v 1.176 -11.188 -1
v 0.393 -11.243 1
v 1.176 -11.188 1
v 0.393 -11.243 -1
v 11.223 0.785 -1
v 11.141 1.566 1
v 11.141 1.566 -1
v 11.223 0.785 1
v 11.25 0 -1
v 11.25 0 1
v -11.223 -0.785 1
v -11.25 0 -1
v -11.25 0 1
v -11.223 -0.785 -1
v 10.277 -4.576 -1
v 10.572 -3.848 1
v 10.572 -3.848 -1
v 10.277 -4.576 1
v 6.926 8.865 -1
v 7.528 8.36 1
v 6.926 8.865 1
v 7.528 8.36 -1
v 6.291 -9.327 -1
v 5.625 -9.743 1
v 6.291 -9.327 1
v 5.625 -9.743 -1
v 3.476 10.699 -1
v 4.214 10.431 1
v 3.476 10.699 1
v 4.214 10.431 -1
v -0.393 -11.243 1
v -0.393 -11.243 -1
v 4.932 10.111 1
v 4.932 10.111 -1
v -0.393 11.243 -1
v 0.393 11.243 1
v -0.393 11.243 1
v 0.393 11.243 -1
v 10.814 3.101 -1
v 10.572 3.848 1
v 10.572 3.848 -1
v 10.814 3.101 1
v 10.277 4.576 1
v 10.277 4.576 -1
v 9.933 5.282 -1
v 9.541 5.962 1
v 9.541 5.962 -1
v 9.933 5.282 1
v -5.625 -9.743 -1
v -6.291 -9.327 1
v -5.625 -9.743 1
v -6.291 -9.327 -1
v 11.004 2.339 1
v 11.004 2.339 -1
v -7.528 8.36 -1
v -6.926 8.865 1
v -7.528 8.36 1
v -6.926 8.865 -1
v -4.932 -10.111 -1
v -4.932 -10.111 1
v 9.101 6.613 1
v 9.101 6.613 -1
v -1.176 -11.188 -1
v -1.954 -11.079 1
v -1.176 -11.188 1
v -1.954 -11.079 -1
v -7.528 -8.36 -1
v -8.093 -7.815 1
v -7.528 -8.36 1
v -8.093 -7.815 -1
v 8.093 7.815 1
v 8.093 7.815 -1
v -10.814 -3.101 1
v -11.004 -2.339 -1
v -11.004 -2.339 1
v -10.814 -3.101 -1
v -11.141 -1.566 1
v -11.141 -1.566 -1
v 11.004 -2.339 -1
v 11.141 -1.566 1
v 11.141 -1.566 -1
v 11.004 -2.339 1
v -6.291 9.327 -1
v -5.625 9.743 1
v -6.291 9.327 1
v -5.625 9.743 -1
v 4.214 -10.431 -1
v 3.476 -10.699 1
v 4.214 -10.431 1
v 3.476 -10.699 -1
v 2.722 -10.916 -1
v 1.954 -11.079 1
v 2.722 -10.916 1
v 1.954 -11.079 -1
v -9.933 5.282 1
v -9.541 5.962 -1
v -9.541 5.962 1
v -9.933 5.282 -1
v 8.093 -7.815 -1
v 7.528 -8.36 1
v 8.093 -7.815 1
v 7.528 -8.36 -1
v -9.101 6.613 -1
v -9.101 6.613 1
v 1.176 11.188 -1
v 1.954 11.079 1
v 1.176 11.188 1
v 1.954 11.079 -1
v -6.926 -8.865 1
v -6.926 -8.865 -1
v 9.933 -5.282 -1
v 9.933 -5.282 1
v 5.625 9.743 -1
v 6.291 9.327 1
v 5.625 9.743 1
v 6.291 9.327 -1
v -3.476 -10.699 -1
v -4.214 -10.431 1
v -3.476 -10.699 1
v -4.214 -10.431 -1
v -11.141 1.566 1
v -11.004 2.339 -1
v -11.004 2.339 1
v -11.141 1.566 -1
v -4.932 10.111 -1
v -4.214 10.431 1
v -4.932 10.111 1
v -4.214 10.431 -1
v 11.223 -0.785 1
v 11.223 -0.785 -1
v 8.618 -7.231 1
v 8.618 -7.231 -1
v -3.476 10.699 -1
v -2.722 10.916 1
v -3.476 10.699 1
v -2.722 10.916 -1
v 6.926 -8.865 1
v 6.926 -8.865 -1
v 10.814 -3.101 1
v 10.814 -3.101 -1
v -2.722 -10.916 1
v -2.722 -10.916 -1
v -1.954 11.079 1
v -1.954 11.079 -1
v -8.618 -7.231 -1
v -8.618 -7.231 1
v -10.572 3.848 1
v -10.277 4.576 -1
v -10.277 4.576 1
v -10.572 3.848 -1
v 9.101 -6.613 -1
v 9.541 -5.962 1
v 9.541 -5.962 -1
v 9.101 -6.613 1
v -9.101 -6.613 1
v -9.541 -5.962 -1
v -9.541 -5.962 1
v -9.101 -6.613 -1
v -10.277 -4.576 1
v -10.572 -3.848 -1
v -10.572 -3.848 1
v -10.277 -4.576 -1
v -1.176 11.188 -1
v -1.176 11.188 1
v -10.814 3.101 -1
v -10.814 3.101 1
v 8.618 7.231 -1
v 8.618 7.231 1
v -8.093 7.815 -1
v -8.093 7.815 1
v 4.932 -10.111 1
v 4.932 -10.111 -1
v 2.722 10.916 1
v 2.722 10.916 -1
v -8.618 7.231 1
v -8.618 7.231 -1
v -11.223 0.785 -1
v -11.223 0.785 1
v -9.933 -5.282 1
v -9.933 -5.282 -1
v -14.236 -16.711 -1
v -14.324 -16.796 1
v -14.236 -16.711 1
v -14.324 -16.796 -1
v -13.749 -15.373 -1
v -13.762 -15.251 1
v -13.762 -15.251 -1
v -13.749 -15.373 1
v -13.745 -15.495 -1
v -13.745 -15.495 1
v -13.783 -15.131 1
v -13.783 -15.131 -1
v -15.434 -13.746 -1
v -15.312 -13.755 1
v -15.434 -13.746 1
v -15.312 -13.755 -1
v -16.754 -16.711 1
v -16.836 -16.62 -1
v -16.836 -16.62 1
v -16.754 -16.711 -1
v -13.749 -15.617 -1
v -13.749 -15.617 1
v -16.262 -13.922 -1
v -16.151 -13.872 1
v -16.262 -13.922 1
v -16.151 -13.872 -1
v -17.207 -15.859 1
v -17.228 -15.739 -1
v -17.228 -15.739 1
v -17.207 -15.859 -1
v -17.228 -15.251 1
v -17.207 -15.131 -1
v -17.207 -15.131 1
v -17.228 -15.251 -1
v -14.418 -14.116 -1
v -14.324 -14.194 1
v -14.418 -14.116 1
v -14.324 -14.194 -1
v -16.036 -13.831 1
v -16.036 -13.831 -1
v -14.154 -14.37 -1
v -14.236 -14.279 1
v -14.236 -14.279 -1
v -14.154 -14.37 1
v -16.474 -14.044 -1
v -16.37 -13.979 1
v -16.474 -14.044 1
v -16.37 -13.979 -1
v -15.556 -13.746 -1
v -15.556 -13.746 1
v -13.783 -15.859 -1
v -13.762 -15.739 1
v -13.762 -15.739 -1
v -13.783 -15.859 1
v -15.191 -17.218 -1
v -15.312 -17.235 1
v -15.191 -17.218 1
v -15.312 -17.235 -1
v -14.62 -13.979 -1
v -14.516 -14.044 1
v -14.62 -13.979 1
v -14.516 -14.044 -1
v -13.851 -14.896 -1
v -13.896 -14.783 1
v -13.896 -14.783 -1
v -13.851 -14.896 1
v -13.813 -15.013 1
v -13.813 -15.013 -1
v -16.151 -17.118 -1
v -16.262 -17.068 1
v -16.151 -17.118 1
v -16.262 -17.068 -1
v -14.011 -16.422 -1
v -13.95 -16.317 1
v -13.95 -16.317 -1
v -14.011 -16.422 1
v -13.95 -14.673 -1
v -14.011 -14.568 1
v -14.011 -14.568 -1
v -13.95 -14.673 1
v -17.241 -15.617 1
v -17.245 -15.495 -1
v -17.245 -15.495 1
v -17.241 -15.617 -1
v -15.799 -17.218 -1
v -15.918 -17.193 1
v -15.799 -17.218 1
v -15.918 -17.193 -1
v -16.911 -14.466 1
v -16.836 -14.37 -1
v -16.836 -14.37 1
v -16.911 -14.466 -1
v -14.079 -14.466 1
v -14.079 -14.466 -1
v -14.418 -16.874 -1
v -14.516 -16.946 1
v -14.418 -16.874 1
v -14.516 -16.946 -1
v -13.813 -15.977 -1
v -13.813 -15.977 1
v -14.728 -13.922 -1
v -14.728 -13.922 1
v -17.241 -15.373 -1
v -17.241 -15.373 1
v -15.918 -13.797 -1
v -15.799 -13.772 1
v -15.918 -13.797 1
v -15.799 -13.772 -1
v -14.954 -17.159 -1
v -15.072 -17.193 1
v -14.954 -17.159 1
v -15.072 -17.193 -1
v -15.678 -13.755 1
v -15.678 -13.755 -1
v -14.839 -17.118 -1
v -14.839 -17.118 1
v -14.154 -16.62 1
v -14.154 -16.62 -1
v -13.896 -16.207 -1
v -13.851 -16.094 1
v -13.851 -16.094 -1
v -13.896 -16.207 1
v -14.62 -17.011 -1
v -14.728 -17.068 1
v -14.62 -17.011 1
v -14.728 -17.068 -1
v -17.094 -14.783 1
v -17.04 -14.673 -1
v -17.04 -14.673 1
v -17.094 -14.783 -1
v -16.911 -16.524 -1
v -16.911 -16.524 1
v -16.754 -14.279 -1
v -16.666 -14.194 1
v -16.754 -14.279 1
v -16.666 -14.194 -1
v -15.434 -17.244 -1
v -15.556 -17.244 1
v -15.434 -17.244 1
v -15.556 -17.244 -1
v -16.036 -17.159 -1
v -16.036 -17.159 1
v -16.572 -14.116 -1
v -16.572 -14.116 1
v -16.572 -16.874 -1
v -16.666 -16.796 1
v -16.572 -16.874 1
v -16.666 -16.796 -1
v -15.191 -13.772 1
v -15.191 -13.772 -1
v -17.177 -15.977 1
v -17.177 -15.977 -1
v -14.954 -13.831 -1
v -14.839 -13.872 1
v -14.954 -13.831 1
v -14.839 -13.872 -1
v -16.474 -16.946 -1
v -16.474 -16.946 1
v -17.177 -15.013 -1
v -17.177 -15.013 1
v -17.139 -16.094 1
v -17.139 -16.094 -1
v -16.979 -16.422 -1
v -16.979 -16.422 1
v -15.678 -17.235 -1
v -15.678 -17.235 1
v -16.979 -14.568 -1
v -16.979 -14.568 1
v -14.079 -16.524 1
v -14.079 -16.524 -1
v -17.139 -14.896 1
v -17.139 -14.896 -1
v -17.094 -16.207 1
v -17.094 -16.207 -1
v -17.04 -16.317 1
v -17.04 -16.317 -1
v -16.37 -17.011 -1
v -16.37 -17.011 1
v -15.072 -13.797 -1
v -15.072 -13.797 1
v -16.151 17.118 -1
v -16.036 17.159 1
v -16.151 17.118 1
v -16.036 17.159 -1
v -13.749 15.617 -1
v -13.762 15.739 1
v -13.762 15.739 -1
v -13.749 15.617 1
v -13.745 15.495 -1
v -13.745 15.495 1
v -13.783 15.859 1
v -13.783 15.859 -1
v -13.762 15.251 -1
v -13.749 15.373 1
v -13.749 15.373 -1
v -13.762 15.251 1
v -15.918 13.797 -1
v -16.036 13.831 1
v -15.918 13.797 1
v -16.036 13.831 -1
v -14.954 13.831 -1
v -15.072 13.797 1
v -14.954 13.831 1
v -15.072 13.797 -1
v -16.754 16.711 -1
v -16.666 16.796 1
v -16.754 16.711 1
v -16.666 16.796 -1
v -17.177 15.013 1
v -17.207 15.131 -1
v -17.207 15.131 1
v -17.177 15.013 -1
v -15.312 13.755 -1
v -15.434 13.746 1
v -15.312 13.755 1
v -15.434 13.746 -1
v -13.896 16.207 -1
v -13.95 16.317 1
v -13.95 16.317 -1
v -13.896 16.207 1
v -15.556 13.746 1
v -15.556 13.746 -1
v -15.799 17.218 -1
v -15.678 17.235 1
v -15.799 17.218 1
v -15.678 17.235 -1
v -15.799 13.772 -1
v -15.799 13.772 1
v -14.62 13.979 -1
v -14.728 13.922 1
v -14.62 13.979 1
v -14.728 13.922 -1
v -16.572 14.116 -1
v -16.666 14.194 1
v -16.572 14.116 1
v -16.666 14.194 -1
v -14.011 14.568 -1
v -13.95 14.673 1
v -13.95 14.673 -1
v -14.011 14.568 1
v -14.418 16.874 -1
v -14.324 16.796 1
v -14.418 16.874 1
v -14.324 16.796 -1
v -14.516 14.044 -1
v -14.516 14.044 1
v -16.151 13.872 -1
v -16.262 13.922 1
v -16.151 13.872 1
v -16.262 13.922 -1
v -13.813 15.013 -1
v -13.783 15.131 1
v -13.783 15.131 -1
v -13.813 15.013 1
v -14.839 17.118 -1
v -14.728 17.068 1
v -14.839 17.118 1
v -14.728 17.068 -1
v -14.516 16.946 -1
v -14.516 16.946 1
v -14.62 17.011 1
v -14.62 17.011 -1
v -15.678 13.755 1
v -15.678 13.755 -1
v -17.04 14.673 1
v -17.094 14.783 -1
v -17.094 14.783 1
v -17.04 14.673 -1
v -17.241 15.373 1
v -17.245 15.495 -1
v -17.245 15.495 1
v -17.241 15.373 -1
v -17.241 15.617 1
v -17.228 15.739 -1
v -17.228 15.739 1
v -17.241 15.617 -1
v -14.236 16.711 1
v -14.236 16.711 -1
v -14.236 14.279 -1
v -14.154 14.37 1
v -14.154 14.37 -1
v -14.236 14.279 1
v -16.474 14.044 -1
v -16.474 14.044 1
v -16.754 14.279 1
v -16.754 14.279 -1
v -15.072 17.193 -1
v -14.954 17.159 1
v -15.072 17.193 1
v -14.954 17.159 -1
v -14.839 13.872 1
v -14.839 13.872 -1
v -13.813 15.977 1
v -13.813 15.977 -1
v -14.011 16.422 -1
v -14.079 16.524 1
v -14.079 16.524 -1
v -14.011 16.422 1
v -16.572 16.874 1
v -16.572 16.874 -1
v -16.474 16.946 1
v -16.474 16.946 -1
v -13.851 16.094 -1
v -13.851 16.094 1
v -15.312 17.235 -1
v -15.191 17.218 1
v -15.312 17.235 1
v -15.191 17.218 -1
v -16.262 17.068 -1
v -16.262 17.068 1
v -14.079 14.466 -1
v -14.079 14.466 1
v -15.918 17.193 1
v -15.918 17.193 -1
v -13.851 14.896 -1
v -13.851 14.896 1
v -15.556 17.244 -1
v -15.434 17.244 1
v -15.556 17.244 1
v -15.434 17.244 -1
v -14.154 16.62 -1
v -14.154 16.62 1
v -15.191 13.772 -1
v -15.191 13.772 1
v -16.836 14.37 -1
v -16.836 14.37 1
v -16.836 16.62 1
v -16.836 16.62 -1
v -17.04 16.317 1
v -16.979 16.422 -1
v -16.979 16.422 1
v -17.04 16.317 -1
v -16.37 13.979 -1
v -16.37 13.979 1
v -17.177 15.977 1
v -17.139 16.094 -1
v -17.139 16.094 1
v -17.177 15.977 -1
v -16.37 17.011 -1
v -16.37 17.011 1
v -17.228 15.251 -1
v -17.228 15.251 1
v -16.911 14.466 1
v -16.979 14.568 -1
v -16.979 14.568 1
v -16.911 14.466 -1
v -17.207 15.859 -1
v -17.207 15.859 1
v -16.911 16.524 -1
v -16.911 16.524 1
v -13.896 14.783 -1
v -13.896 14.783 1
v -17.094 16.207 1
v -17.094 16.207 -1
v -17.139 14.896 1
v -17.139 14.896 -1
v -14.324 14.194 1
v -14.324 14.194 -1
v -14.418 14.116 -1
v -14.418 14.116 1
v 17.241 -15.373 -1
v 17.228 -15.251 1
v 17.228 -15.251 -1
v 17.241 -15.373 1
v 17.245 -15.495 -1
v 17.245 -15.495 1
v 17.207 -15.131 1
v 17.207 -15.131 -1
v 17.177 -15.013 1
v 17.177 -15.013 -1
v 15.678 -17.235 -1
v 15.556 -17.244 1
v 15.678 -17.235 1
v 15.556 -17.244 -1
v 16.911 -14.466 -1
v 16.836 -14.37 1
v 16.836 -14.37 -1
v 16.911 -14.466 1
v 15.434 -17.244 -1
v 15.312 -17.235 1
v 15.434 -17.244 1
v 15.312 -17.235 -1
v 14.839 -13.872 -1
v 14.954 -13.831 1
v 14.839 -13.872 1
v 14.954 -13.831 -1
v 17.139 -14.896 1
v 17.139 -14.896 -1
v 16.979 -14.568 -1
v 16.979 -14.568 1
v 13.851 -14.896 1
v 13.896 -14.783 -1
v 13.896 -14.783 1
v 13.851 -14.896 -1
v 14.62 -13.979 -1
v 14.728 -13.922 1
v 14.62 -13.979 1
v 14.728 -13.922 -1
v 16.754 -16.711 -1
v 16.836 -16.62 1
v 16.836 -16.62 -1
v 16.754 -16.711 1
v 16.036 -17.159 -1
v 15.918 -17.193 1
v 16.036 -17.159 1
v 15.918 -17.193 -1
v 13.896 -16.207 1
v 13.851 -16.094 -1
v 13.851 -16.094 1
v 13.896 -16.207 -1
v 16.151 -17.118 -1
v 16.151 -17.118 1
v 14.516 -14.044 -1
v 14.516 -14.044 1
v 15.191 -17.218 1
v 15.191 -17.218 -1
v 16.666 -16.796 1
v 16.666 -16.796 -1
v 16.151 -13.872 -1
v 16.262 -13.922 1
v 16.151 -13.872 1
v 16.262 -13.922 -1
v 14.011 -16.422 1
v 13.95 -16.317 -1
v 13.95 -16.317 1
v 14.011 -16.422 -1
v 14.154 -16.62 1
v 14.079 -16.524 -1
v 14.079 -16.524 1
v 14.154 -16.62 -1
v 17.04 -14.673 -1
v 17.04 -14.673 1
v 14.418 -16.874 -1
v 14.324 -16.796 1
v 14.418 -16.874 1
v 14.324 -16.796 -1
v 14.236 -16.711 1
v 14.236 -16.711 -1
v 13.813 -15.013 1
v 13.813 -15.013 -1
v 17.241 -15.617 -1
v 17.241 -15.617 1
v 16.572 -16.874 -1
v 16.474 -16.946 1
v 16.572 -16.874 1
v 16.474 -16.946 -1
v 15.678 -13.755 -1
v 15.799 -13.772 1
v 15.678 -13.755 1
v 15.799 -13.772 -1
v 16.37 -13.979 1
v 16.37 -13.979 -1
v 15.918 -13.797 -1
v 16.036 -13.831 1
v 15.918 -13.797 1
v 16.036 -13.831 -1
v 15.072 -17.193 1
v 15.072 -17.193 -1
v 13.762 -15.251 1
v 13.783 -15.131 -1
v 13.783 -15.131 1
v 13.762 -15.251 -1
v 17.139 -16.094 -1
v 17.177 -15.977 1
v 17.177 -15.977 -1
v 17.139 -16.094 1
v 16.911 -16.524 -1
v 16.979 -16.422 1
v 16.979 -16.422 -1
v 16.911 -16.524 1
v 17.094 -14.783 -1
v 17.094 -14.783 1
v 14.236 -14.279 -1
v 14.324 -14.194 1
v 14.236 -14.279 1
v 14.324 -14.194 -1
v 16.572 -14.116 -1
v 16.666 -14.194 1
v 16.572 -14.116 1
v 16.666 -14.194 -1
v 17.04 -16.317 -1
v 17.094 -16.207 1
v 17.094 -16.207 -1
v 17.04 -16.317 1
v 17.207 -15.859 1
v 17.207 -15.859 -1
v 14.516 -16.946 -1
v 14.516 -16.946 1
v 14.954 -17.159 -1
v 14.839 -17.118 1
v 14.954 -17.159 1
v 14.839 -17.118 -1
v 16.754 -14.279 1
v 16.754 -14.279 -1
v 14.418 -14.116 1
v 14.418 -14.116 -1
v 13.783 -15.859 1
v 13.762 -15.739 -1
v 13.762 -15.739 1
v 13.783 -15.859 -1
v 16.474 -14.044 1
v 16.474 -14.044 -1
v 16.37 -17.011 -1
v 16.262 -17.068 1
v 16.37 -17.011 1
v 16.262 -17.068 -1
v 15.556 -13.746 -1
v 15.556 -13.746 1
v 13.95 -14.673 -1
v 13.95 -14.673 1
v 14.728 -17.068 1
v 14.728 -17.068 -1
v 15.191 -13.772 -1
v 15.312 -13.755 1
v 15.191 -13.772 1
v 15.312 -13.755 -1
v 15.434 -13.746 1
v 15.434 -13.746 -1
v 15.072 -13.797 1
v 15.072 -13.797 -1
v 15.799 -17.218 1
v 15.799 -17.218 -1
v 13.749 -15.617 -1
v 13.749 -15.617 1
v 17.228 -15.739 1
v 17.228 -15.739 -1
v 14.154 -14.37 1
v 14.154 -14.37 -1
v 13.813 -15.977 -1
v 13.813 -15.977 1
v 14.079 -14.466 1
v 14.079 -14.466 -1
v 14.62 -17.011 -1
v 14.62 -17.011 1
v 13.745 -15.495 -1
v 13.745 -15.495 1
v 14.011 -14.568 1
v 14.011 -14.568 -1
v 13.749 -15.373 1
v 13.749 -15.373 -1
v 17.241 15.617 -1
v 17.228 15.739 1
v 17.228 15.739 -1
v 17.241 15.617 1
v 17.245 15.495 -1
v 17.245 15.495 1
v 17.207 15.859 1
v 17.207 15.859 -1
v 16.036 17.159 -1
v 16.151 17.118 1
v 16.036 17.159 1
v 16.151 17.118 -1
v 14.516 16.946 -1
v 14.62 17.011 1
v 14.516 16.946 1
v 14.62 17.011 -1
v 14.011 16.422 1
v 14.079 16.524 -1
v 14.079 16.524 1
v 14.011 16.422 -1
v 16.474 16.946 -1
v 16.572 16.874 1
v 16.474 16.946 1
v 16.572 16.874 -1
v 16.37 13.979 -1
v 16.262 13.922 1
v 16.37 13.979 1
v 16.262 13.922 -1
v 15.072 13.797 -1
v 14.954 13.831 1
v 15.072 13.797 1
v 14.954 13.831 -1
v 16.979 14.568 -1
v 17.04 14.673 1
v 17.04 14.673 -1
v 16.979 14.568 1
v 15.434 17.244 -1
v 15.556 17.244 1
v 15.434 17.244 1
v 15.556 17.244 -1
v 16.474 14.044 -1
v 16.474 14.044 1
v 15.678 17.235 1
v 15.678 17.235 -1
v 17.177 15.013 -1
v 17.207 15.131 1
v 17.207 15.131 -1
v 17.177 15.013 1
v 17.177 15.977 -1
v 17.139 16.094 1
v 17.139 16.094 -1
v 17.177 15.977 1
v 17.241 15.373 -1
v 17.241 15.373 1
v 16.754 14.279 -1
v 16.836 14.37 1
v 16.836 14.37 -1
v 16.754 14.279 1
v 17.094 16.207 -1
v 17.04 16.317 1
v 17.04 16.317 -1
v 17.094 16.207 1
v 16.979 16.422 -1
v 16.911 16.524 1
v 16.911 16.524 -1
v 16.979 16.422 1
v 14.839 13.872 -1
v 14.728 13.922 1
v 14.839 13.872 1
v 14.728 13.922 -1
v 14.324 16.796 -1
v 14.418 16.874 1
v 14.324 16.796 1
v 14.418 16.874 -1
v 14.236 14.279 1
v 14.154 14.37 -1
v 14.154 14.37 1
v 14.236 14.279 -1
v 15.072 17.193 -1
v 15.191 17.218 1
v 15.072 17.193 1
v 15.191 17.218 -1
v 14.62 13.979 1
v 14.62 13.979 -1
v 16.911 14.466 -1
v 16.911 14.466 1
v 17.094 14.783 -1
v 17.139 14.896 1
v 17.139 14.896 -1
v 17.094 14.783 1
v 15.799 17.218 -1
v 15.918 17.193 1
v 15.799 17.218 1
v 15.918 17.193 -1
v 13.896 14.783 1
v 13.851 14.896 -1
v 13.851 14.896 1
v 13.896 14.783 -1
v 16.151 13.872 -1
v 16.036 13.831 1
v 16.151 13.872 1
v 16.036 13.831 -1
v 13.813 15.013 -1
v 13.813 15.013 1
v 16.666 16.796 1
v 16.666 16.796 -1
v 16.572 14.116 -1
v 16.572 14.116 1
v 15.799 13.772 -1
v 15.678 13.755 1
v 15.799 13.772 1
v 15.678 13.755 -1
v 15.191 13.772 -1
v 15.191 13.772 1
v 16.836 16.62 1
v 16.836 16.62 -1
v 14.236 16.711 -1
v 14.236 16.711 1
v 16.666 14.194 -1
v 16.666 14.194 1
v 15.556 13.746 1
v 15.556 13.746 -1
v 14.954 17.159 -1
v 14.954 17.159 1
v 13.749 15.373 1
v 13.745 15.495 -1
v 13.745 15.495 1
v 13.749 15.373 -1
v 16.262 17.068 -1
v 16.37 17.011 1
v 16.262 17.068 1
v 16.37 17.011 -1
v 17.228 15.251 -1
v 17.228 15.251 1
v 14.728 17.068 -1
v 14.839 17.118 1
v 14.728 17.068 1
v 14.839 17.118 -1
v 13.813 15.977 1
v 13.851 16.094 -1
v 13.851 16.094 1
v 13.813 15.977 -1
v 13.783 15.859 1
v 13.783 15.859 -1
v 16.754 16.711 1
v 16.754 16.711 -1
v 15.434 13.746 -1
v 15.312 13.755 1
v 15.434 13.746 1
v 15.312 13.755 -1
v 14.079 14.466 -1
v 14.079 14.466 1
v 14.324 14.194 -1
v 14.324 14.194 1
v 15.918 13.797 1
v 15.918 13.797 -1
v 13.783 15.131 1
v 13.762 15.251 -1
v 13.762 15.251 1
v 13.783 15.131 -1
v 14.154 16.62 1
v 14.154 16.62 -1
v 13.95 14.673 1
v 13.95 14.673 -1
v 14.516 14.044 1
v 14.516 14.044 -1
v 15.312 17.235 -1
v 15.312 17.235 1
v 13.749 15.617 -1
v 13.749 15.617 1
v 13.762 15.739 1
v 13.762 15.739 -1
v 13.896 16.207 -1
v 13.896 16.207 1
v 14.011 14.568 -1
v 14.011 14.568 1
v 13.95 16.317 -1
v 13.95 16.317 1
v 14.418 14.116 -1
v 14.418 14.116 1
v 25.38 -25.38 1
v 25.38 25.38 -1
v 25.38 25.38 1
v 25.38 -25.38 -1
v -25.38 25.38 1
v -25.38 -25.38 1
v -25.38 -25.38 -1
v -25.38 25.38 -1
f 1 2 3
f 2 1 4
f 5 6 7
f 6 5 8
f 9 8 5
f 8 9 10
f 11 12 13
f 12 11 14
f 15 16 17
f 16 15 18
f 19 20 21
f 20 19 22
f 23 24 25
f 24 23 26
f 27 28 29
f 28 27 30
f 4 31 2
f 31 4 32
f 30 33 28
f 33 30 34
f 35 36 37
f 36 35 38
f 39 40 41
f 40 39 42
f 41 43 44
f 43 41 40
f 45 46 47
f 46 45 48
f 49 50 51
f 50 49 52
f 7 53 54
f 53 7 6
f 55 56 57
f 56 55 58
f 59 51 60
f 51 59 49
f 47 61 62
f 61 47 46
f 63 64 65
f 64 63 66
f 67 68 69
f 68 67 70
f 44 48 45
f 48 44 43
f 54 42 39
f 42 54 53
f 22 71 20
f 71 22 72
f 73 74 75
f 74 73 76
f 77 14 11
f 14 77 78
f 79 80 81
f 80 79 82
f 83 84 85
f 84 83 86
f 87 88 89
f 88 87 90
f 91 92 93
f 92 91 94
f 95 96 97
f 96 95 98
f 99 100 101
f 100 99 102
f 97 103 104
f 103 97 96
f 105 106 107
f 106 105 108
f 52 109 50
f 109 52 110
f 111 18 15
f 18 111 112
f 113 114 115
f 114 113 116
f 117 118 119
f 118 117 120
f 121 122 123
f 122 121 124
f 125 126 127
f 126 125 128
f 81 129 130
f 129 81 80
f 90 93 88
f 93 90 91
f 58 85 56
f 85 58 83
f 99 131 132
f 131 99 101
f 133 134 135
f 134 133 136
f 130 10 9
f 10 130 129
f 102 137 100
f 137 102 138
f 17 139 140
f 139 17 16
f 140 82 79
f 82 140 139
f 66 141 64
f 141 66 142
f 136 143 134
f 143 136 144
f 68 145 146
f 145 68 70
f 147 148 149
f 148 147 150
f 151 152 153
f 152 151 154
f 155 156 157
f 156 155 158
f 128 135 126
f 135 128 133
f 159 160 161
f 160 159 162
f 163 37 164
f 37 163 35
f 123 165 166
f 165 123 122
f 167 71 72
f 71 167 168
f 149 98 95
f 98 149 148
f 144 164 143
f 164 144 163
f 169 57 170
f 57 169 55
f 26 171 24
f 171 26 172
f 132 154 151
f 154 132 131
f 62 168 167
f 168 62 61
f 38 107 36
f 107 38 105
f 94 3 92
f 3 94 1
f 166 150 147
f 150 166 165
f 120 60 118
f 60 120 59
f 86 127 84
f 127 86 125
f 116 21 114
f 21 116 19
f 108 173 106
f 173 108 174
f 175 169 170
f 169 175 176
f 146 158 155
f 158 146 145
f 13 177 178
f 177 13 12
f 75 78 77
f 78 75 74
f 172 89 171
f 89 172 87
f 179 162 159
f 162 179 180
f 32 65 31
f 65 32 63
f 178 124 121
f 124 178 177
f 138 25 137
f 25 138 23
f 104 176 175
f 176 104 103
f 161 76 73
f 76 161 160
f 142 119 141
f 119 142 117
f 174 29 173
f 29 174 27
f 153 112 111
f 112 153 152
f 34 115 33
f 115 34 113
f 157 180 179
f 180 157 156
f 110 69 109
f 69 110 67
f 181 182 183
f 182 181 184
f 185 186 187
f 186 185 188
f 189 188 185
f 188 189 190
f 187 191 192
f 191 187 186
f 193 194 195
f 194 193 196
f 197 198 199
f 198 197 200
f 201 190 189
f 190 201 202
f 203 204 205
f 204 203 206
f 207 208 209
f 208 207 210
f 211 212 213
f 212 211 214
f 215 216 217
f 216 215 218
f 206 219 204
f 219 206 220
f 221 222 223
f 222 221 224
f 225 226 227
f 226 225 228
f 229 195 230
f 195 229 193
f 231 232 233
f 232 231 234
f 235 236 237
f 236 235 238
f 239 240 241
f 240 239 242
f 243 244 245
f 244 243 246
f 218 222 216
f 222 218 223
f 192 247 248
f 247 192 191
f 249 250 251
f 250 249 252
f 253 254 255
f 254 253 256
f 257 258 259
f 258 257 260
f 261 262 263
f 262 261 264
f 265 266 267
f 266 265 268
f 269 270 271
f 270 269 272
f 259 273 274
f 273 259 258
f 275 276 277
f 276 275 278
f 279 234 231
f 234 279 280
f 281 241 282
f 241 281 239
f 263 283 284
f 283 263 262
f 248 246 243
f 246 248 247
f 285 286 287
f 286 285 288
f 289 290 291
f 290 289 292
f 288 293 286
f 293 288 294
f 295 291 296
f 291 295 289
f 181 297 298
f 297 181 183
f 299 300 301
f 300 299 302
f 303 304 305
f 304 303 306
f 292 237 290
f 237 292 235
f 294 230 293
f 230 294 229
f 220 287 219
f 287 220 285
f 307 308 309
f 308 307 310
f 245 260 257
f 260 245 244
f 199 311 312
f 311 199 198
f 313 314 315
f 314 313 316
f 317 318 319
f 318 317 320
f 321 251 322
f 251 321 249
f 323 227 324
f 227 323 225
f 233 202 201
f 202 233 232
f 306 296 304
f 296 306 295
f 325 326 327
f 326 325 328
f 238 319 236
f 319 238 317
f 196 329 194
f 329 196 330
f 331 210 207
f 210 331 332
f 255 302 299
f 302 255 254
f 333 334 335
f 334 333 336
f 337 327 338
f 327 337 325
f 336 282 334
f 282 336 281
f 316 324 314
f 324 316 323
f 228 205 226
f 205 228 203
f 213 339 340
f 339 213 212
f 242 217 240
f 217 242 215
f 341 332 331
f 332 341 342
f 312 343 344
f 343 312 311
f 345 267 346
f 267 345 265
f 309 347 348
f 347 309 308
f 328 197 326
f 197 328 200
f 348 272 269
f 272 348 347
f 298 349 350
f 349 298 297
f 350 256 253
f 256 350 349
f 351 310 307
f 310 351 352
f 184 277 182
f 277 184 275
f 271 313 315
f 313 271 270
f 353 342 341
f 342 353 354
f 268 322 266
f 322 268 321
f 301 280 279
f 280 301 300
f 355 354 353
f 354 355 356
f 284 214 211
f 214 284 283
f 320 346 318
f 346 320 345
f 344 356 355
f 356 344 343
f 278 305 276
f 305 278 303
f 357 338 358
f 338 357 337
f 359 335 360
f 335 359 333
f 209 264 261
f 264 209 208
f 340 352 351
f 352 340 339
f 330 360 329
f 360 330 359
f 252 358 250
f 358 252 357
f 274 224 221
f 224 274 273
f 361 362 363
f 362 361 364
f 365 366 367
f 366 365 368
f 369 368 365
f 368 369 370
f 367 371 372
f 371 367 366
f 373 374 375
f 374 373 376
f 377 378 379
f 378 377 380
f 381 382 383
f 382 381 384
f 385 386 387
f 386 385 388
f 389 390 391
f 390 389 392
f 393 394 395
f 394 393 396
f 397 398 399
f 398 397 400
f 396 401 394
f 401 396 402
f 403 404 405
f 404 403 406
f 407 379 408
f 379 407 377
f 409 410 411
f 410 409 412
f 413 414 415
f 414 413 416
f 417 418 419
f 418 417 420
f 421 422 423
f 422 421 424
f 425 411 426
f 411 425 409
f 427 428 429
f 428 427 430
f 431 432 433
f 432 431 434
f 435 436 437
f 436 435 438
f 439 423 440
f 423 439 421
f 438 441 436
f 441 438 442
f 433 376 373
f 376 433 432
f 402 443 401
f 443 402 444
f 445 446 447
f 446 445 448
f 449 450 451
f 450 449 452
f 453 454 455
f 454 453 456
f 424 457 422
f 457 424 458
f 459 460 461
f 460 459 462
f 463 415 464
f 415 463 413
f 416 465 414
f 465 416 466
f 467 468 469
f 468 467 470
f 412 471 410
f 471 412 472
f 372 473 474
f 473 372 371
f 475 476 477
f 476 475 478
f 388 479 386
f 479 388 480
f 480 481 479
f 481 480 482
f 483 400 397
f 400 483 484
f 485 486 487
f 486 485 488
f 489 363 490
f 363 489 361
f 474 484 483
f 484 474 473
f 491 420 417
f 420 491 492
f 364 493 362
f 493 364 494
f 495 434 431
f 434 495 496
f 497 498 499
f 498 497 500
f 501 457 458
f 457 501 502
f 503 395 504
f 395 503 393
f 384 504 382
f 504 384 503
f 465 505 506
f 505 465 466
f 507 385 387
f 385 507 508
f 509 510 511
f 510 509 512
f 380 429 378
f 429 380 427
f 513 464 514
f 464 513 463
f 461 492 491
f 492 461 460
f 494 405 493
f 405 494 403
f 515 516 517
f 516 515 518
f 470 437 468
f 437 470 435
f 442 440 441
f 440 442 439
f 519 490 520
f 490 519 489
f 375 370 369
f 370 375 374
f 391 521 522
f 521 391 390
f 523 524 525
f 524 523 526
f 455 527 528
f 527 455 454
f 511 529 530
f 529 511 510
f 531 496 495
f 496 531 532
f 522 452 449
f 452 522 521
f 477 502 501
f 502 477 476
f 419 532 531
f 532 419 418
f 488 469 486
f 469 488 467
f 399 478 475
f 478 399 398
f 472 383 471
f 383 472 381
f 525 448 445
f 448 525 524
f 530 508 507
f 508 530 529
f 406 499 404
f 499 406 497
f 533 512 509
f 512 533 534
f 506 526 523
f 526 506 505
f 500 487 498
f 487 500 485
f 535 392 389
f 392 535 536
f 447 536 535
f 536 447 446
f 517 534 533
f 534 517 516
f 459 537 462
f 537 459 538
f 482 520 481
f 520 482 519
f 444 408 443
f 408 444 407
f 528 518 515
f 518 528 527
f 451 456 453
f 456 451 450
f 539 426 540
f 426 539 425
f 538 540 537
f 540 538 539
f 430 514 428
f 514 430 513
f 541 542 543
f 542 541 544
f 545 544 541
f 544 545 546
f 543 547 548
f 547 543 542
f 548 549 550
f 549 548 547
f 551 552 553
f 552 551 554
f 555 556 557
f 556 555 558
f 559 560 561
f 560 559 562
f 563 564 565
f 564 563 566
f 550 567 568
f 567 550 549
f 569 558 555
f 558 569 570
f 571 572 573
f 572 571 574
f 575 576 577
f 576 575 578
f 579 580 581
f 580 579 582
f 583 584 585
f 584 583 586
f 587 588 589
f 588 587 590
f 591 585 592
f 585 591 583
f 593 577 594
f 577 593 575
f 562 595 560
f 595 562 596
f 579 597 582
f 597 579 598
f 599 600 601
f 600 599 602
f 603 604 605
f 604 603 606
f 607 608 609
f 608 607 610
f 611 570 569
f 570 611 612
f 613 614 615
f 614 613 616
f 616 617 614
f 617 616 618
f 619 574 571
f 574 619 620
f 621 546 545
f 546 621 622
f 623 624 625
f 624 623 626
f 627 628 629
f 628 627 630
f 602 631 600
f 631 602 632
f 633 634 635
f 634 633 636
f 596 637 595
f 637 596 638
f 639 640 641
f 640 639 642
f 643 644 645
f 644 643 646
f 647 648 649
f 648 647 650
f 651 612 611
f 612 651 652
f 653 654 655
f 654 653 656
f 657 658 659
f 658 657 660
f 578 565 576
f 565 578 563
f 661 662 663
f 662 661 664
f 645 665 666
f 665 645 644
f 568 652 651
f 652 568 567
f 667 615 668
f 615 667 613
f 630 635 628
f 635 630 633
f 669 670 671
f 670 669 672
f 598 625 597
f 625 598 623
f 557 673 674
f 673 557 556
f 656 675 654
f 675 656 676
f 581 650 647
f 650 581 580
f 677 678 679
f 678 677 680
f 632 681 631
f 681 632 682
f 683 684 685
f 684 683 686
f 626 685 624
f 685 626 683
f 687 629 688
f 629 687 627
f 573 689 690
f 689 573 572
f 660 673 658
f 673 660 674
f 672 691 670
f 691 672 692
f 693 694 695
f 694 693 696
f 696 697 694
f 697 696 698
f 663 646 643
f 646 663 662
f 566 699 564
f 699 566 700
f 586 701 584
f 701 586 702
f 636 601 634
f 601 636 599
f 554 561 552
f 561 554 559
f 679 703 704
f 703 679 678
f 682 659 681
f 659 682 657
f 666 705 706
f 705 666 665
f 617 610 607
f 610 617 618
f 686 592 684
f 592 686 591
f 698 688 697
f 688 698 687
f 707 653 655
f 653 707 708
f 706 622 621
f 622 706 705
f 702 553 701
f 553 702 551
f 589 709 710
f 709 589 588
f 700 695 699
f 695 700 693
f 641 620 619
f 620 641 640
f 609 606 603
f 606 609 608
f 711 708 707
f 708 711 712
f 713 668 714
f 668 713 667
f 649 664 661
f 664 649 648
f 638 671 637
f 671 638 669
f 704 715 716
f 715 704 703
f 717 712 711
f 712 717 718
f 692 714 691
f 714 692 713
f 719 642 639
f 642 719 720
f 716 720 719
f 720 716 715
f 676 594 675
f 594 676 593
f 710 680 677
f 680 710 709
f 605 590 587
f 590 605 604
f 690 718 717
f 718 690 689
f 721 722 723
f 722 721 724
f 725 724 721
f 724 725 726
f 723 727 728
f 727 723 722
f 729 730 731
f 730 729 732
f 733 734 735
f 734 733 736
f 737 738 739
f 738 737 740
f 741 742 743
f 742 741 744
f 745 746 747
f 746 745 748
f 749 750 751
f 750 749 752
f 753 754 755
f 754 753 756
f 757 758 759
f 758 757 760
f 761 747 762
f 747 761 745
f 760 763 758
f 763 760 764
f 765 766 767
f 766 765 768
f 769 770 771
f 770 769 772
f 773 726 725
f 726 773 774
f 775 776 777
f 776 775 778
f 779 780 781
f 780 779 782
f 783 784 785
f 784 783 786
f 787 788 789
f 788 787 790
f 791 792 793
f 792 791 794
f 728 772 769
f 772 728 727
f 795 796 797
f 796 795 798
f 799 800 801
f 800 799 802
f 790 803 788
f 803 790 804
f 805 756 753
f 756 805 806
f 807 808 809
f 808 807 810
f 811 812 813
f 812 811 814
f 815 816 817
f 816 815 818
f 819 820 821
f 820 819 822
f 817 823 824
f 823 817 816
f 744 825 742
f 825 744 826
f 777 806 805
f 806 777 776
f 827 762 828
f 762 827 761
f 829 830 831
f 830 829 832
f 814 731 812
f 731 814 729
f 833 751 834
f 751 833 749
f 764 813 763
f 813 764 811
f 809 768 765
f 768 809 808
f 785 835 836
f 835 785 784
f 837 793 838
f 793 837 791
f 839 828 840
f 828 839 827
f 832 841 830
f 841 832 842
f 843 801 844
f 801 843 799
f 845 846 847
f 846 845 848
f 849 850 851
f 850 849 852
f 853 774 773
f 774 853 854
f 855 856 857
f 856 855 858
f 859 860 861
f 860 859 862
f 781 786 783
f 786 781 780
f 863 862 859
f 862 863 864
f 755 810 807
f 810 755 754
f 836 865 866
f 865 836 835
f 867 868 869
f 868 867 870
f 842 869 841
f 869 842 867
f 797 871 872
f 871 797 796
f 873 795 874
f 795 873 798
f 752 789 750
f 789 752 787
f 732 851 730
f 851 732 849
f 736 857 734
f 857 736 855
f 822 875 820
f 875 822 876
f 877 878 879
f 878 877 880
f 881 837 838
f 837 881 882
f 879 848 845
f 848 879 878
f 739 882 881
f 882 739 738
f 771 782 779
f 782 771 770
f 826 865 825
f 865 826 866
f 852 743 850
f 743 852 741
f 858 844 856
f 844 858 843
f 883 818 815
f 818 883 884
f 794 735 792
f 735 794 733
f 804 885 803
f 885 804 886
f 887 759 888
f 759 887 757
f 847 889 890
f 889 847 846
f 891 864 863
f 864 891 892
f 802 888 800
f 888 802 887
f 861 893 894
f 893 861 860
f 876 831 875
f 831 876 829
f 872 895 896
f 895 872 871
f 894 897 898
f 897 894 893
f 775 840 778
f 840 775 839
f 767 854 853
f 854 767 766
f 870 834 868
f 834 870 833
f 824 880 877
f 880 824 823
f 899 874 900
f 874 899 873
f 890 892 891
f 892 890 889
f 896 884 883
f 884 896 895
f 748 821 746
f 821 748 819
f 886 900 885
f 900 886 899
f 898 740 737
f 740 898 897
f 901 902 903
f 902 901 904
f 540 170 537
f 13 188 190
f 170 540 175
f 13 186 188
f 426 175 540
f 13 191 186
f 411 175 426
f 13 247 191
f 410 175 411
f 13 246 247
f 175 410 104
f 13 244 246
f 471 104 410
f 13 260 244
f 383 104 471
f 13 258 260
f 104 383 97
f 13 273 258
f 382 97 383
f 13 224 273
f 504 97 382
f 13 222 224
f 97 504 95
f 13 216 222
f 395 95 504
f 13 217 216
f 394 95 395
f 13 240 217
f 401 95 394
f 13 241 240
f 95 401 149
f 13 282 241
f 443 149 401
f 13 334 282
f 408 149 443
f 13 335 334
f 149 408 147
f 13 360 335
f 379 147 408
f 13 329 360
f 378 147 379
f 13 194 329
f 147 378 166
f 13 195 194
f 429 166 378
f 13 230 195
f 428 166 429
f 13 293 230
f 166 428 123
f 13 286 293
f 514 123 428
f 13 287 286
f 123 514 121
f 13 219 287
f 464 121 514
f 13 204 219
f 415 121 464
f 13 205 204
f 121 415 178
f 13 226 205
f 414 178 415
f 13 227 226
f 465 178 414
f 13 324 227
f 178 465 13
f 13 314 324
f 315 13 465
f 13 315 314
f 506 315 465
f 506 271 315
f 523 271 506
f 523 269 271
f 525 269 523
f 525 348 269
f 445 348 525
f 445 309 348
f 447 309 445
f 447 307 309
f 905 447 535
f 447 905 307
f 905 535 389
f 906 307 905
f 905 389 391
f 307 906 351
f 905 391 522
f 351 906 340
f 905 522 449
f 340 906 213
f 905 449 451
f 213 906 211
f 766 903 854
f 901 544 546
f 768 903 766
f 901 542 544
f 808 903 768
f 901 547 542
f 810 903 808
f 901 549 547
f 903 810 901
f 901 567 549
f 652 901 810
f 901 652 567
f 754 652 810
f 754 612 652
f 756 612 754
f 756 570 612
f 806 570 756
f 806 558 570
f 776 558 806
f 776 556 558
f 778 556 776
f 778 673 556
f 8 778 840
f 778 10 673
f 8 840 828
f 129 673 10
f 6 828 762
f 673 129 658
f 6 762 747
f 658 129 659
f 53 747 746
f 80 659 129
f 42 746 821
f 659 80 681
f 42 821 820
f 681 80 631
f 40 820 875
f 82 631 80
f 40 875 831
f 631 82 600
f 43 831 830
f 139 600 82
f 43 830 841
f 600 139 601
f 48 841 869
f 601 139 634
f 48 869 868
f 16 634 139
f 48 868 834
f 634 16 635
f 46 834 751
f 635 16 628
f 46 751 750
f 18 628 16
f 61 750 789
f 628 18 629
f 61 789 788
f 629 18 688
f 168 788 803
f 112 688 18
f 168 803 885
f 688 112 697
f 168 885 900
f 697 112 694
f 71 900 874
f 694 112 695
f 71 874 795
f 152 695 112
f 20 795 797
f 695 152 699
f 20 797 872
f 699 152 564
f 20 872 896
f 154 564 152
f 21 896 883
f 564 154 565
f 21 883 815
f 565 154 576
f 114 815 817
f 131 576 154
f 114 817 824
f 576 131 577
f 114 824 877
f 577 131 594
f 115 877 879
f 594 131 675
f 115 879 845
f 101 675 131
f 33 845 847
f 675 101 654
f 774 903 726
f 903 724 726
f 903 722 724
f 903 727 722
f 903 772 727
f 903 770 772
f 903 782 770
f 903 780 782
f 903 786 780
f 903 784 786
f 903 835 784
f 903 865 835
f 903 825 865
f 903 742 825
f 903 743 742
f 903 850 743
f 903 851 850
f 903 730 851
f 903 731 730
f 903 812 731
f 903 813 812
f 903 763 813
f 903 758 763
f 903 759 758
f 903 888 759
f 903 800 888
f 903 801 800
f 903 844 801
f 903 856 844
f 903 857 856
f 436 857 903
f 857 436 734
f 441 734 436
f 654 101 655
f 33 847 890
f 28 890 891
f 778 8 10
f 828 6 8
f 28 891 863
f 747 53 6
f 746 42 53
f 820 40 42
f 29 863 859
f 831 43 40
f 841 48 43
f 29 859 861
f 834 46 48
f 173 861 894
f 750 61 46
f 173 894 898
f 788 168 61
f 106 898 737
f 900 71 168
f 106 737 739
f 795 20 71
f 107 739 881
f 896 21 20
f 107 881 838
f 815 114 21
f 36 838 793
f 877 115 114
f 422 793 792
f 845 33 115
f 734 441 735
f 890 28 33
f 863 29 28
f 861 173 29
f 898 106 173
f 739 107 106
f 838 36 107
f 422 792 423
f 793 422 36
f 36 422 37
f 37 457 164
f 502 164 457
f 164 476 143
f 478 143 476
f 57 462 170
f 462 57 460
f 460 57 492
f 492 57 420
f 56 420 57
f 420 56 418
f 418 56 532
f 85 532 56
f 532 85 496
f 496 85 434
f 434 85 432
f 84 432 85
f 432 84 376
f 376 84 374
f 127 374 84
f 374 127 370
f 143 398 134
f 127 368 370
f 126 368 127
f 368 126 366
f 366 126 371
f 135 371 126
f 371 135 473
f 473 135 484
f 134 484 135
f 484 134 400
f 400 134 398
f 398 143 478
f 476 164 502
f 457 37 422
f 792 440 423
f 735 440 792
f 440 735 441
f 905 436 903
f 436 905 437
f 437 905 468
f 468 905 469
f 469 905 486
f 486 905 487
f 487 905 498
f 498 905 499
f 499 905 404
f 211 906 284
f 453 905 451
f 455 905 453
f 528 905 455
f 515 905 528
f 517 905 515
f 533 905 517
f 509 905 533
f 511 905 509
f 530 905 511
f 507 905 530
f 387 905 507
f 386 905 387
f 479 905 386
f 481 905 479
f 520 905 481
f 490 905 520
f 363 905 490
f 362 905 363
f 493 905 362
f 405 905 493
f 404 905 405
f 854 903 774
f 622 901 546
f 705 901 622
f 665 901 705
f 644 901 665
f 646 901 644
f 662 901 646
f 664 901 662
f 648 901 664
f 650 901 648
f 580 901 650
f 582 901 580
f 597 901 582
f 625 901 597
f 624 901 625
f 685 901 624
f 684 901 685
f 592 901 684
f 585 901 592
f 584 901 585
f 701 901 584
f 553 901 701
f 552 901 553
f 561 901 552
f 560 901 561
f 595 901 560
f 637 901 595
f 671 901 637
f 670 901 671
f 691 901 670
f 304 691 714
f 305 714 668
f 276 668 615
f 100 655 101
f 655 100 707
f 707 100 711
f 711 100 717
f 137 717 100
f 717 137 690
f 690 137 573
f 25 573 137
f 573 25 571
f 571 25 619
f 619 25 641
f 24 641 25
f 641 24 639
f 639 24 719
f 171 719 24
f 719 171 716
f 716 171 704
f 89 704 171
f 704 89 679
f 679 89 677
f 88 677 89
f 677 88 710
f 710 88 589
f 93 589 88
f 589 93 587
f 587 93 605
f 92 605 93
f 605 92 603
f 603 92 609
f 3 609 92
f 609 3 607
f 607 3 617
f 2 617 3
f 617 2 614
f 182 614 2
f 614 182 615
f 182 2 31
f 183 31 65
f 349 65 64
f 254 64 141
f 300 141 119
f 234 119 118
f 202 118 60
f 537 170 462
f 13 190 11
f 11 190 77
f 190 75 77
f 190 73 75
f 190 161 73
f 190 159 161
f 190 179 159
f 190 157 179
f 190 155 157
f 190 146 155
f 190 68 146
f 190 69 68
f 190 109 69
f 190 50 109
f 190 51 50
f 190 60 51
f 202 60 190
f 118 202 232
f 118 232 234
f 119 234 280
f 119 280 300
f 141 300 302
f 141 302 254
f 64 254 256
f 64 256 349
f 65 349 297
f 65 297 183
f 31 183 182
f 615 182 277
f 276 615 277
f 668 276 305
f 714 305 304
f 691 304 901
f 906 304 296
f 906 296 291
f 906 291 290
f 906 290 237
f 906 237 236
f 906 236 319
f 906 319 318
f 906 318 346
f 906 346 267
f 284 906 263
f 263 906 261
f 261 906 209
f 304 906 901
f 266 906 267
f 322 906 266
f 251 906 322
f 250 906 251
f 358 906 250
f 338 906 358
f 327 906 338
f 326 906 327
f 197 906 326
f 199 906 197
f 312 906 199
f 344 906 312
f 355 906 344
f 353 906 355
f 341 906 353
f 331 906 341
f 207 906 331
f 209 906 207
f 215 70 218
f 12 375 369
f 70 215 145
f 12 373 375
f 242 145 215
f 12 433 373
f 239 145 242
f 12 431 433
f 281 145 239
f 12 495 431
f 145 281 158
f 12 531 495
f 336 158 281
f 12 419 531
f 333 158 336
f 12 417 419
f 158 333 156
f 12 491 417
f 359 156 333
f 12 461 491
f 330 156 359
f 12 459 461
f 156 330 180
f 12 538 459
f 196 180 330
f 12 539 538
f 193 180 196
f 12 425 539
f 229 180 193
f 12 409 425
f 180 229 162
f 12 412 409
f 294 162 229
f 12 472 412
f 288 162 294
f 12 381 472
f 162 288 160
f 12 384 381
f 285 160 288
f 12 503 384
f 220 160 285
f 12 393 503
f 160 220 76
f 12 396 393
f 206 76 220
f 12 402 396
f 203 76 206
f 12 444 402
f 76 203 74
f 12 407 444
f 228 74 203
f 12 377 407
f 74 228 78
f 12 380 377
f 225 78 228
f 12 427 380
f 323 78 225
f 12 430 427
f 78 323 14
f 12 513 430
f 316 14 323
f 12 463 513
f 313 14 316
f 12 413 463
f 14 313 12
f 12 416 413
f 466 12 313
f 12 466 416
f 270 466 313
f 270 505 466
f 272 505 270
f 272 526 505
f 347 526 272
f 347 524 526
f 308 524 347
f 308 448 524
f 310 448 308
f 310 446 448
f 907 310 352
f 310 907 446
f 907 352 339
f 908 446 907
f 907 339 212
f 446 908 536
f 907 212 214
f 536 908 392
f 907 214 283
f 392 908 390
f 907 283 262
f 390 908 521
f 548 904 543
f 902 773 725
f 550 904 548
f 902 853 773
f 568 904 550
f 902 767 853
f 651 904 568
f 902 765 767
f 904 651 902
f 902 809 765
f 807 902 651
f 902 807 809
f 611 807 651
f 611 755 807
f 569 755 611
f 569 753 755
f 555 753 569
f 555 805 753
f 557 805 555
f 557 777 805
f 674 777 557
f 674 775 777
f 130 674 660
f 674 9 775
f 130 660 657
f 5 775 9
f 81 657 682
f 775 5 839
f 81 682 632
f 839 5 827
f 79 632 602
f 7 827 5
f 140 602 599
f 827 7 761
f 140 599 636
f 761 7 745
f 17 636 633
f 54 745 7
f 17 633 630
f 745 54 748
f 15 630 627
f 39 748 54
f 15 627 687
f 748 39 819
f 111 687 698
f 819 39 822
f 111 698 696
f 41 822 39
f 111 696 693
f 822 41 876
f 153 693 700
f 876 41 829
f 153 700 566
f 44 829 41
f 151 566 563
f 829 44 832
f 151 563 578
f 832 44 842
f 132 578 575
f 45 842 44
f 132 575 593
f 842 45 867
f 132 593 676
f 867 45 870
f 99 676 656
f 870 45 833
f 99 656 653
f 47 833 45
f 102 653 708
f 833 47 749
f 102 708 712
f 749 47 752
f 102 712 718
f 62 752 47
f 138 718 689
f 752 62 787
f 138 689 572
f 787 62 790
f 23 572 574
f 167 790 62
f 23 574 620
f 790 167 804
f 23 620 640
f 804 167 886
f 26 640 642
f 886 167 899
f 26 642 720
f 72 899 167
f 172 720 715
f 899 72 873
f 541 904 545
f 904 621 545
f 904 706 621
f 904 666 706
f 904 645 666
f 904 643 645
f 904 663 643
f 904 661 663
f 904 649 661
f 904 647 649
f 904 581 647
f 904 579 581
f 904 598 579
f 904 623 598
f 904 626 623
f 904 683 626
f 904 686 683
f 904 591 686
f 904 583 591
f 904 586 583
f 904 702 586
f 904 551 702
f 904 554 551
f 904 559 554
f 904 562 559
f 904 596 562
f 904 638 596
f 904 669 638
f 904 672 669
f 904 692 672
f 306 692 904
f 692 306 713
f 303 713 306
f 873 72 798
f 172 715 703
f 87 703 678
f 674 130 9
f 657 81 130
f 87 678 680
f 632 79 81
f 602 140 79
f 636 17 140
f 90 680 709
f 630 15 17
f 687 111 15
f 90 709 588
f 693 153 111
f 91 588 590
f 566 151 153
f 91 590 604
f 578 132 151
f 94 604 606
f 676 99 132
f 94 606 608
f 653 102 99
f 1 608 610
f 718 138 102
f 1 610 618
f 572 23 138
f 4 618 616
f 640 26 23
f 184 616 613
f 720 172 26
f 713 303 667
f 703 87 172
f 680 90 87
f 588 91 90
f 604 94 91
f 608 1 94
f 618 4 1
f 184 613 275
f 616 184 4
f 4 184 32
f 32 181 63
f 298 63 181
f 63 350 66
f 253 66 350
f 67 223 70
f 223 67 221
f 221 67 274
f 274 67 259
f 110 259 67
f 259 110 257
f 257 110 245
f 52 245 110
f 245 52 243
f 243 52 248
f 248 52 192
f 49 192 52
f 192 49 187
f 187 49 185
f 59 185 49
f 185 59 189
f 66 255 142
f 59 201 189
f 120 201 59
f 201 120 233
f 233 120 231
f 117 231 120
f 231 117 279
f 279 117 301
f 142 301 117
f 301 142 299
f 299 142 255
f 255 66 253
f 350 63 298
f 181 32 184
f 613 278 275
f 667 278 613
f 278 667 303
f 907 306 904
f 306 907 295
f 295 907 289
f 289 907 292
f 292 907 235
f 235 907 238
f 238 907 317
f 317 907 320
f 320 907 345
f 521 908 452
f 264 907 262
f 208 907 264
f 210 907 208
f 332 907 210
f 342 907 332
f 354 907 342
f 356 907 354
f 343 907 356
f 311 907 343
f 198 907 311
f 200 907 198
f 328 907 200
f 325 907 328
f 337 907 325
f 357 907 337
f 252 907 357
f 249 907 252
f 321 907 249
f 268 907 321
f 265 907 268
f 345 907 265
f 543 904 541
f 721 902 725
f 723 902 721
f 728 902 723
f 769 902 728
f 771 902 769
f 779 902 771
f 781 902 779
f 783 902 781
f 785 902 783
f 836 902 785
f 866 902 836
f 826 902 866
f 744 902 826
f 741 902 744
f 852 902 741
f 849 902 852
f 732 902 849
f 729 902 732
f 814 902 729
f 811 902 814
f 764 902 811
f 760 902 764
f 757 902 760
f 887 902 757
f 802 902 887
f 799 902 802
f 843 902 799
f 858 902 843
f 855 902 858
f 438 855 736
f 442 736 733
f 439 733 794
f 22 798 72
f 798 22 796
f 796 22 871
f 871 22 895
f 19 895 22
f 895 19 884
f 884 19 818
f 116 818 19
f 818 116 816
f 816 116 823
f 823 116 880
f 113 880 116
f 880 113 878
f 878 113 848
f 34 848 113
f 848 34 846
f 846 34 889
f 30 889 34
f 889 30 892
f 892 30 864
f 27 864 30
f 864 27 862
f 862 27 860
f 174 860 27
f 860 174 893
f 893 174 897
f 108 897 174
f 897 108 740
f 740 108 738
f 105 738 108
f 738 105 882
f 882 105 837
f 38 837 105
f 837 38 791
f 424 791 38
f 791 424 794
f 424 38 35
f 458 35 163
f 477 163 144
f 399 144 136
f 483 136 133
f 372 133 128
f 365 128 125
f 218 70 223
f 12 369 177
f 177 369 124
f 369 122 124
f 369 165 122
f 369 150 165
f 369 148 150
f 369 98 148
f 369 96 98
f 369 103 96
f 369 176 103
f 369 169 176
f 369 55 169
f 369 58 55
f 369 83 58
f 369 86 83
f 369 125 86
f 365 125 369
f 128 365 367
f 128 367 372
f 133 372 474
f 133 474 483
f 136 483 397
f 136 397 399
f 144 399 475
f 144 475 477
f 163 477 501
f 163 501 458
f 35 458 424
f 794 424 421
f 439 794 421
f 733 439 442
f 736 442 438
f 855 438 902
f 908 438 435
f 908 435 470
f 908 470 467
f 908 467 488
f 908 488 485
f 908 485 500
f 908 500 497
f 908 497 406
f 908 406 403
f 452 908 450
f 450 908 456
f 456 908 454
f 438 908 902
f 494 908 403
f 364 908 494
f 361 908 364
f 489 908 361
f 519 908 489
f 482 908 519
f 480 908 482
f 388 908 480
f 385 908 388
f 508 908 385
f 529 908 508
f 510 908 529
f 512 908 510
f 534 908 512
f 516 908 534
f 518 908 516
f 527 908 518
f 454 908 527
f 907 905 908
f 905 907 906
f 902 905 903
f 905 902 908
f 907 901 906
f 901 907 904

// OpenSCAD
/*
---------87.5-----------------+
  bracket...... 3mm thick     |
--------------------------+   21
           |        | 10  |   |
           |stepper |     |   |
            |        |     +---+
           +--42.3--+

thickness = 3mm
10mm gap before stepper motor


nema 17 stepper
  30.99 mm between holes
  42.3mm size of body
  hole for shaft is 22mm
  raised part of motor to fit in hole is 2mm
*/

module ExtruderMotorBracket(
    thickness = 3,
    width = 87.5,
    depth = 21,
    spaceLeftOfStepper = 10,
    stepperBodySize = 42.3,
    stepperHoleDistance = 30.99,
    stepperHoleDiameter = 3.5,
    stepperShaftHole = 22.5,
    stepperShoulderProtrusion = 2,
    stepperSpacing = 10,  // spacing between our two steppers
    e = 0.01) 
{

    module base() {
        difference() {
            cube([width, (2*stepperBodySize), depth+thickness], center = true);
            translate([thickness,0,-thickness])
                cube([width+e, (2*stepperBodySize)+e, depth+e], center = true);
        }
    }
    //base();
    module stepperHoles(h) {
        cylinder(d=stepperShaftHole, h=h, center=true);
        i = stepperHoleDistance/2;
        translate([-i,-i,0]) cylinder(d=stepperHoleDiameter, h=h, center=true);
        translate([-i, i,0]) cylinder(d=stepperHoleDiameter, h=h, center=true);
        translate([ i,-i,0]) cylinder(d=stepperHoleDiameter, h=h, center=true);
        translate([ i, i,0]) cylinder(d=stepperHoleDiameter, h=h, center=true);
    }
    difference() {
        cube([stepperBodySize*1.2, stepperBodySize*1.2,2], center=true);
        stepperHoles(h=4, $fn=90);
    }
}


ExtruderMotorBracket();
